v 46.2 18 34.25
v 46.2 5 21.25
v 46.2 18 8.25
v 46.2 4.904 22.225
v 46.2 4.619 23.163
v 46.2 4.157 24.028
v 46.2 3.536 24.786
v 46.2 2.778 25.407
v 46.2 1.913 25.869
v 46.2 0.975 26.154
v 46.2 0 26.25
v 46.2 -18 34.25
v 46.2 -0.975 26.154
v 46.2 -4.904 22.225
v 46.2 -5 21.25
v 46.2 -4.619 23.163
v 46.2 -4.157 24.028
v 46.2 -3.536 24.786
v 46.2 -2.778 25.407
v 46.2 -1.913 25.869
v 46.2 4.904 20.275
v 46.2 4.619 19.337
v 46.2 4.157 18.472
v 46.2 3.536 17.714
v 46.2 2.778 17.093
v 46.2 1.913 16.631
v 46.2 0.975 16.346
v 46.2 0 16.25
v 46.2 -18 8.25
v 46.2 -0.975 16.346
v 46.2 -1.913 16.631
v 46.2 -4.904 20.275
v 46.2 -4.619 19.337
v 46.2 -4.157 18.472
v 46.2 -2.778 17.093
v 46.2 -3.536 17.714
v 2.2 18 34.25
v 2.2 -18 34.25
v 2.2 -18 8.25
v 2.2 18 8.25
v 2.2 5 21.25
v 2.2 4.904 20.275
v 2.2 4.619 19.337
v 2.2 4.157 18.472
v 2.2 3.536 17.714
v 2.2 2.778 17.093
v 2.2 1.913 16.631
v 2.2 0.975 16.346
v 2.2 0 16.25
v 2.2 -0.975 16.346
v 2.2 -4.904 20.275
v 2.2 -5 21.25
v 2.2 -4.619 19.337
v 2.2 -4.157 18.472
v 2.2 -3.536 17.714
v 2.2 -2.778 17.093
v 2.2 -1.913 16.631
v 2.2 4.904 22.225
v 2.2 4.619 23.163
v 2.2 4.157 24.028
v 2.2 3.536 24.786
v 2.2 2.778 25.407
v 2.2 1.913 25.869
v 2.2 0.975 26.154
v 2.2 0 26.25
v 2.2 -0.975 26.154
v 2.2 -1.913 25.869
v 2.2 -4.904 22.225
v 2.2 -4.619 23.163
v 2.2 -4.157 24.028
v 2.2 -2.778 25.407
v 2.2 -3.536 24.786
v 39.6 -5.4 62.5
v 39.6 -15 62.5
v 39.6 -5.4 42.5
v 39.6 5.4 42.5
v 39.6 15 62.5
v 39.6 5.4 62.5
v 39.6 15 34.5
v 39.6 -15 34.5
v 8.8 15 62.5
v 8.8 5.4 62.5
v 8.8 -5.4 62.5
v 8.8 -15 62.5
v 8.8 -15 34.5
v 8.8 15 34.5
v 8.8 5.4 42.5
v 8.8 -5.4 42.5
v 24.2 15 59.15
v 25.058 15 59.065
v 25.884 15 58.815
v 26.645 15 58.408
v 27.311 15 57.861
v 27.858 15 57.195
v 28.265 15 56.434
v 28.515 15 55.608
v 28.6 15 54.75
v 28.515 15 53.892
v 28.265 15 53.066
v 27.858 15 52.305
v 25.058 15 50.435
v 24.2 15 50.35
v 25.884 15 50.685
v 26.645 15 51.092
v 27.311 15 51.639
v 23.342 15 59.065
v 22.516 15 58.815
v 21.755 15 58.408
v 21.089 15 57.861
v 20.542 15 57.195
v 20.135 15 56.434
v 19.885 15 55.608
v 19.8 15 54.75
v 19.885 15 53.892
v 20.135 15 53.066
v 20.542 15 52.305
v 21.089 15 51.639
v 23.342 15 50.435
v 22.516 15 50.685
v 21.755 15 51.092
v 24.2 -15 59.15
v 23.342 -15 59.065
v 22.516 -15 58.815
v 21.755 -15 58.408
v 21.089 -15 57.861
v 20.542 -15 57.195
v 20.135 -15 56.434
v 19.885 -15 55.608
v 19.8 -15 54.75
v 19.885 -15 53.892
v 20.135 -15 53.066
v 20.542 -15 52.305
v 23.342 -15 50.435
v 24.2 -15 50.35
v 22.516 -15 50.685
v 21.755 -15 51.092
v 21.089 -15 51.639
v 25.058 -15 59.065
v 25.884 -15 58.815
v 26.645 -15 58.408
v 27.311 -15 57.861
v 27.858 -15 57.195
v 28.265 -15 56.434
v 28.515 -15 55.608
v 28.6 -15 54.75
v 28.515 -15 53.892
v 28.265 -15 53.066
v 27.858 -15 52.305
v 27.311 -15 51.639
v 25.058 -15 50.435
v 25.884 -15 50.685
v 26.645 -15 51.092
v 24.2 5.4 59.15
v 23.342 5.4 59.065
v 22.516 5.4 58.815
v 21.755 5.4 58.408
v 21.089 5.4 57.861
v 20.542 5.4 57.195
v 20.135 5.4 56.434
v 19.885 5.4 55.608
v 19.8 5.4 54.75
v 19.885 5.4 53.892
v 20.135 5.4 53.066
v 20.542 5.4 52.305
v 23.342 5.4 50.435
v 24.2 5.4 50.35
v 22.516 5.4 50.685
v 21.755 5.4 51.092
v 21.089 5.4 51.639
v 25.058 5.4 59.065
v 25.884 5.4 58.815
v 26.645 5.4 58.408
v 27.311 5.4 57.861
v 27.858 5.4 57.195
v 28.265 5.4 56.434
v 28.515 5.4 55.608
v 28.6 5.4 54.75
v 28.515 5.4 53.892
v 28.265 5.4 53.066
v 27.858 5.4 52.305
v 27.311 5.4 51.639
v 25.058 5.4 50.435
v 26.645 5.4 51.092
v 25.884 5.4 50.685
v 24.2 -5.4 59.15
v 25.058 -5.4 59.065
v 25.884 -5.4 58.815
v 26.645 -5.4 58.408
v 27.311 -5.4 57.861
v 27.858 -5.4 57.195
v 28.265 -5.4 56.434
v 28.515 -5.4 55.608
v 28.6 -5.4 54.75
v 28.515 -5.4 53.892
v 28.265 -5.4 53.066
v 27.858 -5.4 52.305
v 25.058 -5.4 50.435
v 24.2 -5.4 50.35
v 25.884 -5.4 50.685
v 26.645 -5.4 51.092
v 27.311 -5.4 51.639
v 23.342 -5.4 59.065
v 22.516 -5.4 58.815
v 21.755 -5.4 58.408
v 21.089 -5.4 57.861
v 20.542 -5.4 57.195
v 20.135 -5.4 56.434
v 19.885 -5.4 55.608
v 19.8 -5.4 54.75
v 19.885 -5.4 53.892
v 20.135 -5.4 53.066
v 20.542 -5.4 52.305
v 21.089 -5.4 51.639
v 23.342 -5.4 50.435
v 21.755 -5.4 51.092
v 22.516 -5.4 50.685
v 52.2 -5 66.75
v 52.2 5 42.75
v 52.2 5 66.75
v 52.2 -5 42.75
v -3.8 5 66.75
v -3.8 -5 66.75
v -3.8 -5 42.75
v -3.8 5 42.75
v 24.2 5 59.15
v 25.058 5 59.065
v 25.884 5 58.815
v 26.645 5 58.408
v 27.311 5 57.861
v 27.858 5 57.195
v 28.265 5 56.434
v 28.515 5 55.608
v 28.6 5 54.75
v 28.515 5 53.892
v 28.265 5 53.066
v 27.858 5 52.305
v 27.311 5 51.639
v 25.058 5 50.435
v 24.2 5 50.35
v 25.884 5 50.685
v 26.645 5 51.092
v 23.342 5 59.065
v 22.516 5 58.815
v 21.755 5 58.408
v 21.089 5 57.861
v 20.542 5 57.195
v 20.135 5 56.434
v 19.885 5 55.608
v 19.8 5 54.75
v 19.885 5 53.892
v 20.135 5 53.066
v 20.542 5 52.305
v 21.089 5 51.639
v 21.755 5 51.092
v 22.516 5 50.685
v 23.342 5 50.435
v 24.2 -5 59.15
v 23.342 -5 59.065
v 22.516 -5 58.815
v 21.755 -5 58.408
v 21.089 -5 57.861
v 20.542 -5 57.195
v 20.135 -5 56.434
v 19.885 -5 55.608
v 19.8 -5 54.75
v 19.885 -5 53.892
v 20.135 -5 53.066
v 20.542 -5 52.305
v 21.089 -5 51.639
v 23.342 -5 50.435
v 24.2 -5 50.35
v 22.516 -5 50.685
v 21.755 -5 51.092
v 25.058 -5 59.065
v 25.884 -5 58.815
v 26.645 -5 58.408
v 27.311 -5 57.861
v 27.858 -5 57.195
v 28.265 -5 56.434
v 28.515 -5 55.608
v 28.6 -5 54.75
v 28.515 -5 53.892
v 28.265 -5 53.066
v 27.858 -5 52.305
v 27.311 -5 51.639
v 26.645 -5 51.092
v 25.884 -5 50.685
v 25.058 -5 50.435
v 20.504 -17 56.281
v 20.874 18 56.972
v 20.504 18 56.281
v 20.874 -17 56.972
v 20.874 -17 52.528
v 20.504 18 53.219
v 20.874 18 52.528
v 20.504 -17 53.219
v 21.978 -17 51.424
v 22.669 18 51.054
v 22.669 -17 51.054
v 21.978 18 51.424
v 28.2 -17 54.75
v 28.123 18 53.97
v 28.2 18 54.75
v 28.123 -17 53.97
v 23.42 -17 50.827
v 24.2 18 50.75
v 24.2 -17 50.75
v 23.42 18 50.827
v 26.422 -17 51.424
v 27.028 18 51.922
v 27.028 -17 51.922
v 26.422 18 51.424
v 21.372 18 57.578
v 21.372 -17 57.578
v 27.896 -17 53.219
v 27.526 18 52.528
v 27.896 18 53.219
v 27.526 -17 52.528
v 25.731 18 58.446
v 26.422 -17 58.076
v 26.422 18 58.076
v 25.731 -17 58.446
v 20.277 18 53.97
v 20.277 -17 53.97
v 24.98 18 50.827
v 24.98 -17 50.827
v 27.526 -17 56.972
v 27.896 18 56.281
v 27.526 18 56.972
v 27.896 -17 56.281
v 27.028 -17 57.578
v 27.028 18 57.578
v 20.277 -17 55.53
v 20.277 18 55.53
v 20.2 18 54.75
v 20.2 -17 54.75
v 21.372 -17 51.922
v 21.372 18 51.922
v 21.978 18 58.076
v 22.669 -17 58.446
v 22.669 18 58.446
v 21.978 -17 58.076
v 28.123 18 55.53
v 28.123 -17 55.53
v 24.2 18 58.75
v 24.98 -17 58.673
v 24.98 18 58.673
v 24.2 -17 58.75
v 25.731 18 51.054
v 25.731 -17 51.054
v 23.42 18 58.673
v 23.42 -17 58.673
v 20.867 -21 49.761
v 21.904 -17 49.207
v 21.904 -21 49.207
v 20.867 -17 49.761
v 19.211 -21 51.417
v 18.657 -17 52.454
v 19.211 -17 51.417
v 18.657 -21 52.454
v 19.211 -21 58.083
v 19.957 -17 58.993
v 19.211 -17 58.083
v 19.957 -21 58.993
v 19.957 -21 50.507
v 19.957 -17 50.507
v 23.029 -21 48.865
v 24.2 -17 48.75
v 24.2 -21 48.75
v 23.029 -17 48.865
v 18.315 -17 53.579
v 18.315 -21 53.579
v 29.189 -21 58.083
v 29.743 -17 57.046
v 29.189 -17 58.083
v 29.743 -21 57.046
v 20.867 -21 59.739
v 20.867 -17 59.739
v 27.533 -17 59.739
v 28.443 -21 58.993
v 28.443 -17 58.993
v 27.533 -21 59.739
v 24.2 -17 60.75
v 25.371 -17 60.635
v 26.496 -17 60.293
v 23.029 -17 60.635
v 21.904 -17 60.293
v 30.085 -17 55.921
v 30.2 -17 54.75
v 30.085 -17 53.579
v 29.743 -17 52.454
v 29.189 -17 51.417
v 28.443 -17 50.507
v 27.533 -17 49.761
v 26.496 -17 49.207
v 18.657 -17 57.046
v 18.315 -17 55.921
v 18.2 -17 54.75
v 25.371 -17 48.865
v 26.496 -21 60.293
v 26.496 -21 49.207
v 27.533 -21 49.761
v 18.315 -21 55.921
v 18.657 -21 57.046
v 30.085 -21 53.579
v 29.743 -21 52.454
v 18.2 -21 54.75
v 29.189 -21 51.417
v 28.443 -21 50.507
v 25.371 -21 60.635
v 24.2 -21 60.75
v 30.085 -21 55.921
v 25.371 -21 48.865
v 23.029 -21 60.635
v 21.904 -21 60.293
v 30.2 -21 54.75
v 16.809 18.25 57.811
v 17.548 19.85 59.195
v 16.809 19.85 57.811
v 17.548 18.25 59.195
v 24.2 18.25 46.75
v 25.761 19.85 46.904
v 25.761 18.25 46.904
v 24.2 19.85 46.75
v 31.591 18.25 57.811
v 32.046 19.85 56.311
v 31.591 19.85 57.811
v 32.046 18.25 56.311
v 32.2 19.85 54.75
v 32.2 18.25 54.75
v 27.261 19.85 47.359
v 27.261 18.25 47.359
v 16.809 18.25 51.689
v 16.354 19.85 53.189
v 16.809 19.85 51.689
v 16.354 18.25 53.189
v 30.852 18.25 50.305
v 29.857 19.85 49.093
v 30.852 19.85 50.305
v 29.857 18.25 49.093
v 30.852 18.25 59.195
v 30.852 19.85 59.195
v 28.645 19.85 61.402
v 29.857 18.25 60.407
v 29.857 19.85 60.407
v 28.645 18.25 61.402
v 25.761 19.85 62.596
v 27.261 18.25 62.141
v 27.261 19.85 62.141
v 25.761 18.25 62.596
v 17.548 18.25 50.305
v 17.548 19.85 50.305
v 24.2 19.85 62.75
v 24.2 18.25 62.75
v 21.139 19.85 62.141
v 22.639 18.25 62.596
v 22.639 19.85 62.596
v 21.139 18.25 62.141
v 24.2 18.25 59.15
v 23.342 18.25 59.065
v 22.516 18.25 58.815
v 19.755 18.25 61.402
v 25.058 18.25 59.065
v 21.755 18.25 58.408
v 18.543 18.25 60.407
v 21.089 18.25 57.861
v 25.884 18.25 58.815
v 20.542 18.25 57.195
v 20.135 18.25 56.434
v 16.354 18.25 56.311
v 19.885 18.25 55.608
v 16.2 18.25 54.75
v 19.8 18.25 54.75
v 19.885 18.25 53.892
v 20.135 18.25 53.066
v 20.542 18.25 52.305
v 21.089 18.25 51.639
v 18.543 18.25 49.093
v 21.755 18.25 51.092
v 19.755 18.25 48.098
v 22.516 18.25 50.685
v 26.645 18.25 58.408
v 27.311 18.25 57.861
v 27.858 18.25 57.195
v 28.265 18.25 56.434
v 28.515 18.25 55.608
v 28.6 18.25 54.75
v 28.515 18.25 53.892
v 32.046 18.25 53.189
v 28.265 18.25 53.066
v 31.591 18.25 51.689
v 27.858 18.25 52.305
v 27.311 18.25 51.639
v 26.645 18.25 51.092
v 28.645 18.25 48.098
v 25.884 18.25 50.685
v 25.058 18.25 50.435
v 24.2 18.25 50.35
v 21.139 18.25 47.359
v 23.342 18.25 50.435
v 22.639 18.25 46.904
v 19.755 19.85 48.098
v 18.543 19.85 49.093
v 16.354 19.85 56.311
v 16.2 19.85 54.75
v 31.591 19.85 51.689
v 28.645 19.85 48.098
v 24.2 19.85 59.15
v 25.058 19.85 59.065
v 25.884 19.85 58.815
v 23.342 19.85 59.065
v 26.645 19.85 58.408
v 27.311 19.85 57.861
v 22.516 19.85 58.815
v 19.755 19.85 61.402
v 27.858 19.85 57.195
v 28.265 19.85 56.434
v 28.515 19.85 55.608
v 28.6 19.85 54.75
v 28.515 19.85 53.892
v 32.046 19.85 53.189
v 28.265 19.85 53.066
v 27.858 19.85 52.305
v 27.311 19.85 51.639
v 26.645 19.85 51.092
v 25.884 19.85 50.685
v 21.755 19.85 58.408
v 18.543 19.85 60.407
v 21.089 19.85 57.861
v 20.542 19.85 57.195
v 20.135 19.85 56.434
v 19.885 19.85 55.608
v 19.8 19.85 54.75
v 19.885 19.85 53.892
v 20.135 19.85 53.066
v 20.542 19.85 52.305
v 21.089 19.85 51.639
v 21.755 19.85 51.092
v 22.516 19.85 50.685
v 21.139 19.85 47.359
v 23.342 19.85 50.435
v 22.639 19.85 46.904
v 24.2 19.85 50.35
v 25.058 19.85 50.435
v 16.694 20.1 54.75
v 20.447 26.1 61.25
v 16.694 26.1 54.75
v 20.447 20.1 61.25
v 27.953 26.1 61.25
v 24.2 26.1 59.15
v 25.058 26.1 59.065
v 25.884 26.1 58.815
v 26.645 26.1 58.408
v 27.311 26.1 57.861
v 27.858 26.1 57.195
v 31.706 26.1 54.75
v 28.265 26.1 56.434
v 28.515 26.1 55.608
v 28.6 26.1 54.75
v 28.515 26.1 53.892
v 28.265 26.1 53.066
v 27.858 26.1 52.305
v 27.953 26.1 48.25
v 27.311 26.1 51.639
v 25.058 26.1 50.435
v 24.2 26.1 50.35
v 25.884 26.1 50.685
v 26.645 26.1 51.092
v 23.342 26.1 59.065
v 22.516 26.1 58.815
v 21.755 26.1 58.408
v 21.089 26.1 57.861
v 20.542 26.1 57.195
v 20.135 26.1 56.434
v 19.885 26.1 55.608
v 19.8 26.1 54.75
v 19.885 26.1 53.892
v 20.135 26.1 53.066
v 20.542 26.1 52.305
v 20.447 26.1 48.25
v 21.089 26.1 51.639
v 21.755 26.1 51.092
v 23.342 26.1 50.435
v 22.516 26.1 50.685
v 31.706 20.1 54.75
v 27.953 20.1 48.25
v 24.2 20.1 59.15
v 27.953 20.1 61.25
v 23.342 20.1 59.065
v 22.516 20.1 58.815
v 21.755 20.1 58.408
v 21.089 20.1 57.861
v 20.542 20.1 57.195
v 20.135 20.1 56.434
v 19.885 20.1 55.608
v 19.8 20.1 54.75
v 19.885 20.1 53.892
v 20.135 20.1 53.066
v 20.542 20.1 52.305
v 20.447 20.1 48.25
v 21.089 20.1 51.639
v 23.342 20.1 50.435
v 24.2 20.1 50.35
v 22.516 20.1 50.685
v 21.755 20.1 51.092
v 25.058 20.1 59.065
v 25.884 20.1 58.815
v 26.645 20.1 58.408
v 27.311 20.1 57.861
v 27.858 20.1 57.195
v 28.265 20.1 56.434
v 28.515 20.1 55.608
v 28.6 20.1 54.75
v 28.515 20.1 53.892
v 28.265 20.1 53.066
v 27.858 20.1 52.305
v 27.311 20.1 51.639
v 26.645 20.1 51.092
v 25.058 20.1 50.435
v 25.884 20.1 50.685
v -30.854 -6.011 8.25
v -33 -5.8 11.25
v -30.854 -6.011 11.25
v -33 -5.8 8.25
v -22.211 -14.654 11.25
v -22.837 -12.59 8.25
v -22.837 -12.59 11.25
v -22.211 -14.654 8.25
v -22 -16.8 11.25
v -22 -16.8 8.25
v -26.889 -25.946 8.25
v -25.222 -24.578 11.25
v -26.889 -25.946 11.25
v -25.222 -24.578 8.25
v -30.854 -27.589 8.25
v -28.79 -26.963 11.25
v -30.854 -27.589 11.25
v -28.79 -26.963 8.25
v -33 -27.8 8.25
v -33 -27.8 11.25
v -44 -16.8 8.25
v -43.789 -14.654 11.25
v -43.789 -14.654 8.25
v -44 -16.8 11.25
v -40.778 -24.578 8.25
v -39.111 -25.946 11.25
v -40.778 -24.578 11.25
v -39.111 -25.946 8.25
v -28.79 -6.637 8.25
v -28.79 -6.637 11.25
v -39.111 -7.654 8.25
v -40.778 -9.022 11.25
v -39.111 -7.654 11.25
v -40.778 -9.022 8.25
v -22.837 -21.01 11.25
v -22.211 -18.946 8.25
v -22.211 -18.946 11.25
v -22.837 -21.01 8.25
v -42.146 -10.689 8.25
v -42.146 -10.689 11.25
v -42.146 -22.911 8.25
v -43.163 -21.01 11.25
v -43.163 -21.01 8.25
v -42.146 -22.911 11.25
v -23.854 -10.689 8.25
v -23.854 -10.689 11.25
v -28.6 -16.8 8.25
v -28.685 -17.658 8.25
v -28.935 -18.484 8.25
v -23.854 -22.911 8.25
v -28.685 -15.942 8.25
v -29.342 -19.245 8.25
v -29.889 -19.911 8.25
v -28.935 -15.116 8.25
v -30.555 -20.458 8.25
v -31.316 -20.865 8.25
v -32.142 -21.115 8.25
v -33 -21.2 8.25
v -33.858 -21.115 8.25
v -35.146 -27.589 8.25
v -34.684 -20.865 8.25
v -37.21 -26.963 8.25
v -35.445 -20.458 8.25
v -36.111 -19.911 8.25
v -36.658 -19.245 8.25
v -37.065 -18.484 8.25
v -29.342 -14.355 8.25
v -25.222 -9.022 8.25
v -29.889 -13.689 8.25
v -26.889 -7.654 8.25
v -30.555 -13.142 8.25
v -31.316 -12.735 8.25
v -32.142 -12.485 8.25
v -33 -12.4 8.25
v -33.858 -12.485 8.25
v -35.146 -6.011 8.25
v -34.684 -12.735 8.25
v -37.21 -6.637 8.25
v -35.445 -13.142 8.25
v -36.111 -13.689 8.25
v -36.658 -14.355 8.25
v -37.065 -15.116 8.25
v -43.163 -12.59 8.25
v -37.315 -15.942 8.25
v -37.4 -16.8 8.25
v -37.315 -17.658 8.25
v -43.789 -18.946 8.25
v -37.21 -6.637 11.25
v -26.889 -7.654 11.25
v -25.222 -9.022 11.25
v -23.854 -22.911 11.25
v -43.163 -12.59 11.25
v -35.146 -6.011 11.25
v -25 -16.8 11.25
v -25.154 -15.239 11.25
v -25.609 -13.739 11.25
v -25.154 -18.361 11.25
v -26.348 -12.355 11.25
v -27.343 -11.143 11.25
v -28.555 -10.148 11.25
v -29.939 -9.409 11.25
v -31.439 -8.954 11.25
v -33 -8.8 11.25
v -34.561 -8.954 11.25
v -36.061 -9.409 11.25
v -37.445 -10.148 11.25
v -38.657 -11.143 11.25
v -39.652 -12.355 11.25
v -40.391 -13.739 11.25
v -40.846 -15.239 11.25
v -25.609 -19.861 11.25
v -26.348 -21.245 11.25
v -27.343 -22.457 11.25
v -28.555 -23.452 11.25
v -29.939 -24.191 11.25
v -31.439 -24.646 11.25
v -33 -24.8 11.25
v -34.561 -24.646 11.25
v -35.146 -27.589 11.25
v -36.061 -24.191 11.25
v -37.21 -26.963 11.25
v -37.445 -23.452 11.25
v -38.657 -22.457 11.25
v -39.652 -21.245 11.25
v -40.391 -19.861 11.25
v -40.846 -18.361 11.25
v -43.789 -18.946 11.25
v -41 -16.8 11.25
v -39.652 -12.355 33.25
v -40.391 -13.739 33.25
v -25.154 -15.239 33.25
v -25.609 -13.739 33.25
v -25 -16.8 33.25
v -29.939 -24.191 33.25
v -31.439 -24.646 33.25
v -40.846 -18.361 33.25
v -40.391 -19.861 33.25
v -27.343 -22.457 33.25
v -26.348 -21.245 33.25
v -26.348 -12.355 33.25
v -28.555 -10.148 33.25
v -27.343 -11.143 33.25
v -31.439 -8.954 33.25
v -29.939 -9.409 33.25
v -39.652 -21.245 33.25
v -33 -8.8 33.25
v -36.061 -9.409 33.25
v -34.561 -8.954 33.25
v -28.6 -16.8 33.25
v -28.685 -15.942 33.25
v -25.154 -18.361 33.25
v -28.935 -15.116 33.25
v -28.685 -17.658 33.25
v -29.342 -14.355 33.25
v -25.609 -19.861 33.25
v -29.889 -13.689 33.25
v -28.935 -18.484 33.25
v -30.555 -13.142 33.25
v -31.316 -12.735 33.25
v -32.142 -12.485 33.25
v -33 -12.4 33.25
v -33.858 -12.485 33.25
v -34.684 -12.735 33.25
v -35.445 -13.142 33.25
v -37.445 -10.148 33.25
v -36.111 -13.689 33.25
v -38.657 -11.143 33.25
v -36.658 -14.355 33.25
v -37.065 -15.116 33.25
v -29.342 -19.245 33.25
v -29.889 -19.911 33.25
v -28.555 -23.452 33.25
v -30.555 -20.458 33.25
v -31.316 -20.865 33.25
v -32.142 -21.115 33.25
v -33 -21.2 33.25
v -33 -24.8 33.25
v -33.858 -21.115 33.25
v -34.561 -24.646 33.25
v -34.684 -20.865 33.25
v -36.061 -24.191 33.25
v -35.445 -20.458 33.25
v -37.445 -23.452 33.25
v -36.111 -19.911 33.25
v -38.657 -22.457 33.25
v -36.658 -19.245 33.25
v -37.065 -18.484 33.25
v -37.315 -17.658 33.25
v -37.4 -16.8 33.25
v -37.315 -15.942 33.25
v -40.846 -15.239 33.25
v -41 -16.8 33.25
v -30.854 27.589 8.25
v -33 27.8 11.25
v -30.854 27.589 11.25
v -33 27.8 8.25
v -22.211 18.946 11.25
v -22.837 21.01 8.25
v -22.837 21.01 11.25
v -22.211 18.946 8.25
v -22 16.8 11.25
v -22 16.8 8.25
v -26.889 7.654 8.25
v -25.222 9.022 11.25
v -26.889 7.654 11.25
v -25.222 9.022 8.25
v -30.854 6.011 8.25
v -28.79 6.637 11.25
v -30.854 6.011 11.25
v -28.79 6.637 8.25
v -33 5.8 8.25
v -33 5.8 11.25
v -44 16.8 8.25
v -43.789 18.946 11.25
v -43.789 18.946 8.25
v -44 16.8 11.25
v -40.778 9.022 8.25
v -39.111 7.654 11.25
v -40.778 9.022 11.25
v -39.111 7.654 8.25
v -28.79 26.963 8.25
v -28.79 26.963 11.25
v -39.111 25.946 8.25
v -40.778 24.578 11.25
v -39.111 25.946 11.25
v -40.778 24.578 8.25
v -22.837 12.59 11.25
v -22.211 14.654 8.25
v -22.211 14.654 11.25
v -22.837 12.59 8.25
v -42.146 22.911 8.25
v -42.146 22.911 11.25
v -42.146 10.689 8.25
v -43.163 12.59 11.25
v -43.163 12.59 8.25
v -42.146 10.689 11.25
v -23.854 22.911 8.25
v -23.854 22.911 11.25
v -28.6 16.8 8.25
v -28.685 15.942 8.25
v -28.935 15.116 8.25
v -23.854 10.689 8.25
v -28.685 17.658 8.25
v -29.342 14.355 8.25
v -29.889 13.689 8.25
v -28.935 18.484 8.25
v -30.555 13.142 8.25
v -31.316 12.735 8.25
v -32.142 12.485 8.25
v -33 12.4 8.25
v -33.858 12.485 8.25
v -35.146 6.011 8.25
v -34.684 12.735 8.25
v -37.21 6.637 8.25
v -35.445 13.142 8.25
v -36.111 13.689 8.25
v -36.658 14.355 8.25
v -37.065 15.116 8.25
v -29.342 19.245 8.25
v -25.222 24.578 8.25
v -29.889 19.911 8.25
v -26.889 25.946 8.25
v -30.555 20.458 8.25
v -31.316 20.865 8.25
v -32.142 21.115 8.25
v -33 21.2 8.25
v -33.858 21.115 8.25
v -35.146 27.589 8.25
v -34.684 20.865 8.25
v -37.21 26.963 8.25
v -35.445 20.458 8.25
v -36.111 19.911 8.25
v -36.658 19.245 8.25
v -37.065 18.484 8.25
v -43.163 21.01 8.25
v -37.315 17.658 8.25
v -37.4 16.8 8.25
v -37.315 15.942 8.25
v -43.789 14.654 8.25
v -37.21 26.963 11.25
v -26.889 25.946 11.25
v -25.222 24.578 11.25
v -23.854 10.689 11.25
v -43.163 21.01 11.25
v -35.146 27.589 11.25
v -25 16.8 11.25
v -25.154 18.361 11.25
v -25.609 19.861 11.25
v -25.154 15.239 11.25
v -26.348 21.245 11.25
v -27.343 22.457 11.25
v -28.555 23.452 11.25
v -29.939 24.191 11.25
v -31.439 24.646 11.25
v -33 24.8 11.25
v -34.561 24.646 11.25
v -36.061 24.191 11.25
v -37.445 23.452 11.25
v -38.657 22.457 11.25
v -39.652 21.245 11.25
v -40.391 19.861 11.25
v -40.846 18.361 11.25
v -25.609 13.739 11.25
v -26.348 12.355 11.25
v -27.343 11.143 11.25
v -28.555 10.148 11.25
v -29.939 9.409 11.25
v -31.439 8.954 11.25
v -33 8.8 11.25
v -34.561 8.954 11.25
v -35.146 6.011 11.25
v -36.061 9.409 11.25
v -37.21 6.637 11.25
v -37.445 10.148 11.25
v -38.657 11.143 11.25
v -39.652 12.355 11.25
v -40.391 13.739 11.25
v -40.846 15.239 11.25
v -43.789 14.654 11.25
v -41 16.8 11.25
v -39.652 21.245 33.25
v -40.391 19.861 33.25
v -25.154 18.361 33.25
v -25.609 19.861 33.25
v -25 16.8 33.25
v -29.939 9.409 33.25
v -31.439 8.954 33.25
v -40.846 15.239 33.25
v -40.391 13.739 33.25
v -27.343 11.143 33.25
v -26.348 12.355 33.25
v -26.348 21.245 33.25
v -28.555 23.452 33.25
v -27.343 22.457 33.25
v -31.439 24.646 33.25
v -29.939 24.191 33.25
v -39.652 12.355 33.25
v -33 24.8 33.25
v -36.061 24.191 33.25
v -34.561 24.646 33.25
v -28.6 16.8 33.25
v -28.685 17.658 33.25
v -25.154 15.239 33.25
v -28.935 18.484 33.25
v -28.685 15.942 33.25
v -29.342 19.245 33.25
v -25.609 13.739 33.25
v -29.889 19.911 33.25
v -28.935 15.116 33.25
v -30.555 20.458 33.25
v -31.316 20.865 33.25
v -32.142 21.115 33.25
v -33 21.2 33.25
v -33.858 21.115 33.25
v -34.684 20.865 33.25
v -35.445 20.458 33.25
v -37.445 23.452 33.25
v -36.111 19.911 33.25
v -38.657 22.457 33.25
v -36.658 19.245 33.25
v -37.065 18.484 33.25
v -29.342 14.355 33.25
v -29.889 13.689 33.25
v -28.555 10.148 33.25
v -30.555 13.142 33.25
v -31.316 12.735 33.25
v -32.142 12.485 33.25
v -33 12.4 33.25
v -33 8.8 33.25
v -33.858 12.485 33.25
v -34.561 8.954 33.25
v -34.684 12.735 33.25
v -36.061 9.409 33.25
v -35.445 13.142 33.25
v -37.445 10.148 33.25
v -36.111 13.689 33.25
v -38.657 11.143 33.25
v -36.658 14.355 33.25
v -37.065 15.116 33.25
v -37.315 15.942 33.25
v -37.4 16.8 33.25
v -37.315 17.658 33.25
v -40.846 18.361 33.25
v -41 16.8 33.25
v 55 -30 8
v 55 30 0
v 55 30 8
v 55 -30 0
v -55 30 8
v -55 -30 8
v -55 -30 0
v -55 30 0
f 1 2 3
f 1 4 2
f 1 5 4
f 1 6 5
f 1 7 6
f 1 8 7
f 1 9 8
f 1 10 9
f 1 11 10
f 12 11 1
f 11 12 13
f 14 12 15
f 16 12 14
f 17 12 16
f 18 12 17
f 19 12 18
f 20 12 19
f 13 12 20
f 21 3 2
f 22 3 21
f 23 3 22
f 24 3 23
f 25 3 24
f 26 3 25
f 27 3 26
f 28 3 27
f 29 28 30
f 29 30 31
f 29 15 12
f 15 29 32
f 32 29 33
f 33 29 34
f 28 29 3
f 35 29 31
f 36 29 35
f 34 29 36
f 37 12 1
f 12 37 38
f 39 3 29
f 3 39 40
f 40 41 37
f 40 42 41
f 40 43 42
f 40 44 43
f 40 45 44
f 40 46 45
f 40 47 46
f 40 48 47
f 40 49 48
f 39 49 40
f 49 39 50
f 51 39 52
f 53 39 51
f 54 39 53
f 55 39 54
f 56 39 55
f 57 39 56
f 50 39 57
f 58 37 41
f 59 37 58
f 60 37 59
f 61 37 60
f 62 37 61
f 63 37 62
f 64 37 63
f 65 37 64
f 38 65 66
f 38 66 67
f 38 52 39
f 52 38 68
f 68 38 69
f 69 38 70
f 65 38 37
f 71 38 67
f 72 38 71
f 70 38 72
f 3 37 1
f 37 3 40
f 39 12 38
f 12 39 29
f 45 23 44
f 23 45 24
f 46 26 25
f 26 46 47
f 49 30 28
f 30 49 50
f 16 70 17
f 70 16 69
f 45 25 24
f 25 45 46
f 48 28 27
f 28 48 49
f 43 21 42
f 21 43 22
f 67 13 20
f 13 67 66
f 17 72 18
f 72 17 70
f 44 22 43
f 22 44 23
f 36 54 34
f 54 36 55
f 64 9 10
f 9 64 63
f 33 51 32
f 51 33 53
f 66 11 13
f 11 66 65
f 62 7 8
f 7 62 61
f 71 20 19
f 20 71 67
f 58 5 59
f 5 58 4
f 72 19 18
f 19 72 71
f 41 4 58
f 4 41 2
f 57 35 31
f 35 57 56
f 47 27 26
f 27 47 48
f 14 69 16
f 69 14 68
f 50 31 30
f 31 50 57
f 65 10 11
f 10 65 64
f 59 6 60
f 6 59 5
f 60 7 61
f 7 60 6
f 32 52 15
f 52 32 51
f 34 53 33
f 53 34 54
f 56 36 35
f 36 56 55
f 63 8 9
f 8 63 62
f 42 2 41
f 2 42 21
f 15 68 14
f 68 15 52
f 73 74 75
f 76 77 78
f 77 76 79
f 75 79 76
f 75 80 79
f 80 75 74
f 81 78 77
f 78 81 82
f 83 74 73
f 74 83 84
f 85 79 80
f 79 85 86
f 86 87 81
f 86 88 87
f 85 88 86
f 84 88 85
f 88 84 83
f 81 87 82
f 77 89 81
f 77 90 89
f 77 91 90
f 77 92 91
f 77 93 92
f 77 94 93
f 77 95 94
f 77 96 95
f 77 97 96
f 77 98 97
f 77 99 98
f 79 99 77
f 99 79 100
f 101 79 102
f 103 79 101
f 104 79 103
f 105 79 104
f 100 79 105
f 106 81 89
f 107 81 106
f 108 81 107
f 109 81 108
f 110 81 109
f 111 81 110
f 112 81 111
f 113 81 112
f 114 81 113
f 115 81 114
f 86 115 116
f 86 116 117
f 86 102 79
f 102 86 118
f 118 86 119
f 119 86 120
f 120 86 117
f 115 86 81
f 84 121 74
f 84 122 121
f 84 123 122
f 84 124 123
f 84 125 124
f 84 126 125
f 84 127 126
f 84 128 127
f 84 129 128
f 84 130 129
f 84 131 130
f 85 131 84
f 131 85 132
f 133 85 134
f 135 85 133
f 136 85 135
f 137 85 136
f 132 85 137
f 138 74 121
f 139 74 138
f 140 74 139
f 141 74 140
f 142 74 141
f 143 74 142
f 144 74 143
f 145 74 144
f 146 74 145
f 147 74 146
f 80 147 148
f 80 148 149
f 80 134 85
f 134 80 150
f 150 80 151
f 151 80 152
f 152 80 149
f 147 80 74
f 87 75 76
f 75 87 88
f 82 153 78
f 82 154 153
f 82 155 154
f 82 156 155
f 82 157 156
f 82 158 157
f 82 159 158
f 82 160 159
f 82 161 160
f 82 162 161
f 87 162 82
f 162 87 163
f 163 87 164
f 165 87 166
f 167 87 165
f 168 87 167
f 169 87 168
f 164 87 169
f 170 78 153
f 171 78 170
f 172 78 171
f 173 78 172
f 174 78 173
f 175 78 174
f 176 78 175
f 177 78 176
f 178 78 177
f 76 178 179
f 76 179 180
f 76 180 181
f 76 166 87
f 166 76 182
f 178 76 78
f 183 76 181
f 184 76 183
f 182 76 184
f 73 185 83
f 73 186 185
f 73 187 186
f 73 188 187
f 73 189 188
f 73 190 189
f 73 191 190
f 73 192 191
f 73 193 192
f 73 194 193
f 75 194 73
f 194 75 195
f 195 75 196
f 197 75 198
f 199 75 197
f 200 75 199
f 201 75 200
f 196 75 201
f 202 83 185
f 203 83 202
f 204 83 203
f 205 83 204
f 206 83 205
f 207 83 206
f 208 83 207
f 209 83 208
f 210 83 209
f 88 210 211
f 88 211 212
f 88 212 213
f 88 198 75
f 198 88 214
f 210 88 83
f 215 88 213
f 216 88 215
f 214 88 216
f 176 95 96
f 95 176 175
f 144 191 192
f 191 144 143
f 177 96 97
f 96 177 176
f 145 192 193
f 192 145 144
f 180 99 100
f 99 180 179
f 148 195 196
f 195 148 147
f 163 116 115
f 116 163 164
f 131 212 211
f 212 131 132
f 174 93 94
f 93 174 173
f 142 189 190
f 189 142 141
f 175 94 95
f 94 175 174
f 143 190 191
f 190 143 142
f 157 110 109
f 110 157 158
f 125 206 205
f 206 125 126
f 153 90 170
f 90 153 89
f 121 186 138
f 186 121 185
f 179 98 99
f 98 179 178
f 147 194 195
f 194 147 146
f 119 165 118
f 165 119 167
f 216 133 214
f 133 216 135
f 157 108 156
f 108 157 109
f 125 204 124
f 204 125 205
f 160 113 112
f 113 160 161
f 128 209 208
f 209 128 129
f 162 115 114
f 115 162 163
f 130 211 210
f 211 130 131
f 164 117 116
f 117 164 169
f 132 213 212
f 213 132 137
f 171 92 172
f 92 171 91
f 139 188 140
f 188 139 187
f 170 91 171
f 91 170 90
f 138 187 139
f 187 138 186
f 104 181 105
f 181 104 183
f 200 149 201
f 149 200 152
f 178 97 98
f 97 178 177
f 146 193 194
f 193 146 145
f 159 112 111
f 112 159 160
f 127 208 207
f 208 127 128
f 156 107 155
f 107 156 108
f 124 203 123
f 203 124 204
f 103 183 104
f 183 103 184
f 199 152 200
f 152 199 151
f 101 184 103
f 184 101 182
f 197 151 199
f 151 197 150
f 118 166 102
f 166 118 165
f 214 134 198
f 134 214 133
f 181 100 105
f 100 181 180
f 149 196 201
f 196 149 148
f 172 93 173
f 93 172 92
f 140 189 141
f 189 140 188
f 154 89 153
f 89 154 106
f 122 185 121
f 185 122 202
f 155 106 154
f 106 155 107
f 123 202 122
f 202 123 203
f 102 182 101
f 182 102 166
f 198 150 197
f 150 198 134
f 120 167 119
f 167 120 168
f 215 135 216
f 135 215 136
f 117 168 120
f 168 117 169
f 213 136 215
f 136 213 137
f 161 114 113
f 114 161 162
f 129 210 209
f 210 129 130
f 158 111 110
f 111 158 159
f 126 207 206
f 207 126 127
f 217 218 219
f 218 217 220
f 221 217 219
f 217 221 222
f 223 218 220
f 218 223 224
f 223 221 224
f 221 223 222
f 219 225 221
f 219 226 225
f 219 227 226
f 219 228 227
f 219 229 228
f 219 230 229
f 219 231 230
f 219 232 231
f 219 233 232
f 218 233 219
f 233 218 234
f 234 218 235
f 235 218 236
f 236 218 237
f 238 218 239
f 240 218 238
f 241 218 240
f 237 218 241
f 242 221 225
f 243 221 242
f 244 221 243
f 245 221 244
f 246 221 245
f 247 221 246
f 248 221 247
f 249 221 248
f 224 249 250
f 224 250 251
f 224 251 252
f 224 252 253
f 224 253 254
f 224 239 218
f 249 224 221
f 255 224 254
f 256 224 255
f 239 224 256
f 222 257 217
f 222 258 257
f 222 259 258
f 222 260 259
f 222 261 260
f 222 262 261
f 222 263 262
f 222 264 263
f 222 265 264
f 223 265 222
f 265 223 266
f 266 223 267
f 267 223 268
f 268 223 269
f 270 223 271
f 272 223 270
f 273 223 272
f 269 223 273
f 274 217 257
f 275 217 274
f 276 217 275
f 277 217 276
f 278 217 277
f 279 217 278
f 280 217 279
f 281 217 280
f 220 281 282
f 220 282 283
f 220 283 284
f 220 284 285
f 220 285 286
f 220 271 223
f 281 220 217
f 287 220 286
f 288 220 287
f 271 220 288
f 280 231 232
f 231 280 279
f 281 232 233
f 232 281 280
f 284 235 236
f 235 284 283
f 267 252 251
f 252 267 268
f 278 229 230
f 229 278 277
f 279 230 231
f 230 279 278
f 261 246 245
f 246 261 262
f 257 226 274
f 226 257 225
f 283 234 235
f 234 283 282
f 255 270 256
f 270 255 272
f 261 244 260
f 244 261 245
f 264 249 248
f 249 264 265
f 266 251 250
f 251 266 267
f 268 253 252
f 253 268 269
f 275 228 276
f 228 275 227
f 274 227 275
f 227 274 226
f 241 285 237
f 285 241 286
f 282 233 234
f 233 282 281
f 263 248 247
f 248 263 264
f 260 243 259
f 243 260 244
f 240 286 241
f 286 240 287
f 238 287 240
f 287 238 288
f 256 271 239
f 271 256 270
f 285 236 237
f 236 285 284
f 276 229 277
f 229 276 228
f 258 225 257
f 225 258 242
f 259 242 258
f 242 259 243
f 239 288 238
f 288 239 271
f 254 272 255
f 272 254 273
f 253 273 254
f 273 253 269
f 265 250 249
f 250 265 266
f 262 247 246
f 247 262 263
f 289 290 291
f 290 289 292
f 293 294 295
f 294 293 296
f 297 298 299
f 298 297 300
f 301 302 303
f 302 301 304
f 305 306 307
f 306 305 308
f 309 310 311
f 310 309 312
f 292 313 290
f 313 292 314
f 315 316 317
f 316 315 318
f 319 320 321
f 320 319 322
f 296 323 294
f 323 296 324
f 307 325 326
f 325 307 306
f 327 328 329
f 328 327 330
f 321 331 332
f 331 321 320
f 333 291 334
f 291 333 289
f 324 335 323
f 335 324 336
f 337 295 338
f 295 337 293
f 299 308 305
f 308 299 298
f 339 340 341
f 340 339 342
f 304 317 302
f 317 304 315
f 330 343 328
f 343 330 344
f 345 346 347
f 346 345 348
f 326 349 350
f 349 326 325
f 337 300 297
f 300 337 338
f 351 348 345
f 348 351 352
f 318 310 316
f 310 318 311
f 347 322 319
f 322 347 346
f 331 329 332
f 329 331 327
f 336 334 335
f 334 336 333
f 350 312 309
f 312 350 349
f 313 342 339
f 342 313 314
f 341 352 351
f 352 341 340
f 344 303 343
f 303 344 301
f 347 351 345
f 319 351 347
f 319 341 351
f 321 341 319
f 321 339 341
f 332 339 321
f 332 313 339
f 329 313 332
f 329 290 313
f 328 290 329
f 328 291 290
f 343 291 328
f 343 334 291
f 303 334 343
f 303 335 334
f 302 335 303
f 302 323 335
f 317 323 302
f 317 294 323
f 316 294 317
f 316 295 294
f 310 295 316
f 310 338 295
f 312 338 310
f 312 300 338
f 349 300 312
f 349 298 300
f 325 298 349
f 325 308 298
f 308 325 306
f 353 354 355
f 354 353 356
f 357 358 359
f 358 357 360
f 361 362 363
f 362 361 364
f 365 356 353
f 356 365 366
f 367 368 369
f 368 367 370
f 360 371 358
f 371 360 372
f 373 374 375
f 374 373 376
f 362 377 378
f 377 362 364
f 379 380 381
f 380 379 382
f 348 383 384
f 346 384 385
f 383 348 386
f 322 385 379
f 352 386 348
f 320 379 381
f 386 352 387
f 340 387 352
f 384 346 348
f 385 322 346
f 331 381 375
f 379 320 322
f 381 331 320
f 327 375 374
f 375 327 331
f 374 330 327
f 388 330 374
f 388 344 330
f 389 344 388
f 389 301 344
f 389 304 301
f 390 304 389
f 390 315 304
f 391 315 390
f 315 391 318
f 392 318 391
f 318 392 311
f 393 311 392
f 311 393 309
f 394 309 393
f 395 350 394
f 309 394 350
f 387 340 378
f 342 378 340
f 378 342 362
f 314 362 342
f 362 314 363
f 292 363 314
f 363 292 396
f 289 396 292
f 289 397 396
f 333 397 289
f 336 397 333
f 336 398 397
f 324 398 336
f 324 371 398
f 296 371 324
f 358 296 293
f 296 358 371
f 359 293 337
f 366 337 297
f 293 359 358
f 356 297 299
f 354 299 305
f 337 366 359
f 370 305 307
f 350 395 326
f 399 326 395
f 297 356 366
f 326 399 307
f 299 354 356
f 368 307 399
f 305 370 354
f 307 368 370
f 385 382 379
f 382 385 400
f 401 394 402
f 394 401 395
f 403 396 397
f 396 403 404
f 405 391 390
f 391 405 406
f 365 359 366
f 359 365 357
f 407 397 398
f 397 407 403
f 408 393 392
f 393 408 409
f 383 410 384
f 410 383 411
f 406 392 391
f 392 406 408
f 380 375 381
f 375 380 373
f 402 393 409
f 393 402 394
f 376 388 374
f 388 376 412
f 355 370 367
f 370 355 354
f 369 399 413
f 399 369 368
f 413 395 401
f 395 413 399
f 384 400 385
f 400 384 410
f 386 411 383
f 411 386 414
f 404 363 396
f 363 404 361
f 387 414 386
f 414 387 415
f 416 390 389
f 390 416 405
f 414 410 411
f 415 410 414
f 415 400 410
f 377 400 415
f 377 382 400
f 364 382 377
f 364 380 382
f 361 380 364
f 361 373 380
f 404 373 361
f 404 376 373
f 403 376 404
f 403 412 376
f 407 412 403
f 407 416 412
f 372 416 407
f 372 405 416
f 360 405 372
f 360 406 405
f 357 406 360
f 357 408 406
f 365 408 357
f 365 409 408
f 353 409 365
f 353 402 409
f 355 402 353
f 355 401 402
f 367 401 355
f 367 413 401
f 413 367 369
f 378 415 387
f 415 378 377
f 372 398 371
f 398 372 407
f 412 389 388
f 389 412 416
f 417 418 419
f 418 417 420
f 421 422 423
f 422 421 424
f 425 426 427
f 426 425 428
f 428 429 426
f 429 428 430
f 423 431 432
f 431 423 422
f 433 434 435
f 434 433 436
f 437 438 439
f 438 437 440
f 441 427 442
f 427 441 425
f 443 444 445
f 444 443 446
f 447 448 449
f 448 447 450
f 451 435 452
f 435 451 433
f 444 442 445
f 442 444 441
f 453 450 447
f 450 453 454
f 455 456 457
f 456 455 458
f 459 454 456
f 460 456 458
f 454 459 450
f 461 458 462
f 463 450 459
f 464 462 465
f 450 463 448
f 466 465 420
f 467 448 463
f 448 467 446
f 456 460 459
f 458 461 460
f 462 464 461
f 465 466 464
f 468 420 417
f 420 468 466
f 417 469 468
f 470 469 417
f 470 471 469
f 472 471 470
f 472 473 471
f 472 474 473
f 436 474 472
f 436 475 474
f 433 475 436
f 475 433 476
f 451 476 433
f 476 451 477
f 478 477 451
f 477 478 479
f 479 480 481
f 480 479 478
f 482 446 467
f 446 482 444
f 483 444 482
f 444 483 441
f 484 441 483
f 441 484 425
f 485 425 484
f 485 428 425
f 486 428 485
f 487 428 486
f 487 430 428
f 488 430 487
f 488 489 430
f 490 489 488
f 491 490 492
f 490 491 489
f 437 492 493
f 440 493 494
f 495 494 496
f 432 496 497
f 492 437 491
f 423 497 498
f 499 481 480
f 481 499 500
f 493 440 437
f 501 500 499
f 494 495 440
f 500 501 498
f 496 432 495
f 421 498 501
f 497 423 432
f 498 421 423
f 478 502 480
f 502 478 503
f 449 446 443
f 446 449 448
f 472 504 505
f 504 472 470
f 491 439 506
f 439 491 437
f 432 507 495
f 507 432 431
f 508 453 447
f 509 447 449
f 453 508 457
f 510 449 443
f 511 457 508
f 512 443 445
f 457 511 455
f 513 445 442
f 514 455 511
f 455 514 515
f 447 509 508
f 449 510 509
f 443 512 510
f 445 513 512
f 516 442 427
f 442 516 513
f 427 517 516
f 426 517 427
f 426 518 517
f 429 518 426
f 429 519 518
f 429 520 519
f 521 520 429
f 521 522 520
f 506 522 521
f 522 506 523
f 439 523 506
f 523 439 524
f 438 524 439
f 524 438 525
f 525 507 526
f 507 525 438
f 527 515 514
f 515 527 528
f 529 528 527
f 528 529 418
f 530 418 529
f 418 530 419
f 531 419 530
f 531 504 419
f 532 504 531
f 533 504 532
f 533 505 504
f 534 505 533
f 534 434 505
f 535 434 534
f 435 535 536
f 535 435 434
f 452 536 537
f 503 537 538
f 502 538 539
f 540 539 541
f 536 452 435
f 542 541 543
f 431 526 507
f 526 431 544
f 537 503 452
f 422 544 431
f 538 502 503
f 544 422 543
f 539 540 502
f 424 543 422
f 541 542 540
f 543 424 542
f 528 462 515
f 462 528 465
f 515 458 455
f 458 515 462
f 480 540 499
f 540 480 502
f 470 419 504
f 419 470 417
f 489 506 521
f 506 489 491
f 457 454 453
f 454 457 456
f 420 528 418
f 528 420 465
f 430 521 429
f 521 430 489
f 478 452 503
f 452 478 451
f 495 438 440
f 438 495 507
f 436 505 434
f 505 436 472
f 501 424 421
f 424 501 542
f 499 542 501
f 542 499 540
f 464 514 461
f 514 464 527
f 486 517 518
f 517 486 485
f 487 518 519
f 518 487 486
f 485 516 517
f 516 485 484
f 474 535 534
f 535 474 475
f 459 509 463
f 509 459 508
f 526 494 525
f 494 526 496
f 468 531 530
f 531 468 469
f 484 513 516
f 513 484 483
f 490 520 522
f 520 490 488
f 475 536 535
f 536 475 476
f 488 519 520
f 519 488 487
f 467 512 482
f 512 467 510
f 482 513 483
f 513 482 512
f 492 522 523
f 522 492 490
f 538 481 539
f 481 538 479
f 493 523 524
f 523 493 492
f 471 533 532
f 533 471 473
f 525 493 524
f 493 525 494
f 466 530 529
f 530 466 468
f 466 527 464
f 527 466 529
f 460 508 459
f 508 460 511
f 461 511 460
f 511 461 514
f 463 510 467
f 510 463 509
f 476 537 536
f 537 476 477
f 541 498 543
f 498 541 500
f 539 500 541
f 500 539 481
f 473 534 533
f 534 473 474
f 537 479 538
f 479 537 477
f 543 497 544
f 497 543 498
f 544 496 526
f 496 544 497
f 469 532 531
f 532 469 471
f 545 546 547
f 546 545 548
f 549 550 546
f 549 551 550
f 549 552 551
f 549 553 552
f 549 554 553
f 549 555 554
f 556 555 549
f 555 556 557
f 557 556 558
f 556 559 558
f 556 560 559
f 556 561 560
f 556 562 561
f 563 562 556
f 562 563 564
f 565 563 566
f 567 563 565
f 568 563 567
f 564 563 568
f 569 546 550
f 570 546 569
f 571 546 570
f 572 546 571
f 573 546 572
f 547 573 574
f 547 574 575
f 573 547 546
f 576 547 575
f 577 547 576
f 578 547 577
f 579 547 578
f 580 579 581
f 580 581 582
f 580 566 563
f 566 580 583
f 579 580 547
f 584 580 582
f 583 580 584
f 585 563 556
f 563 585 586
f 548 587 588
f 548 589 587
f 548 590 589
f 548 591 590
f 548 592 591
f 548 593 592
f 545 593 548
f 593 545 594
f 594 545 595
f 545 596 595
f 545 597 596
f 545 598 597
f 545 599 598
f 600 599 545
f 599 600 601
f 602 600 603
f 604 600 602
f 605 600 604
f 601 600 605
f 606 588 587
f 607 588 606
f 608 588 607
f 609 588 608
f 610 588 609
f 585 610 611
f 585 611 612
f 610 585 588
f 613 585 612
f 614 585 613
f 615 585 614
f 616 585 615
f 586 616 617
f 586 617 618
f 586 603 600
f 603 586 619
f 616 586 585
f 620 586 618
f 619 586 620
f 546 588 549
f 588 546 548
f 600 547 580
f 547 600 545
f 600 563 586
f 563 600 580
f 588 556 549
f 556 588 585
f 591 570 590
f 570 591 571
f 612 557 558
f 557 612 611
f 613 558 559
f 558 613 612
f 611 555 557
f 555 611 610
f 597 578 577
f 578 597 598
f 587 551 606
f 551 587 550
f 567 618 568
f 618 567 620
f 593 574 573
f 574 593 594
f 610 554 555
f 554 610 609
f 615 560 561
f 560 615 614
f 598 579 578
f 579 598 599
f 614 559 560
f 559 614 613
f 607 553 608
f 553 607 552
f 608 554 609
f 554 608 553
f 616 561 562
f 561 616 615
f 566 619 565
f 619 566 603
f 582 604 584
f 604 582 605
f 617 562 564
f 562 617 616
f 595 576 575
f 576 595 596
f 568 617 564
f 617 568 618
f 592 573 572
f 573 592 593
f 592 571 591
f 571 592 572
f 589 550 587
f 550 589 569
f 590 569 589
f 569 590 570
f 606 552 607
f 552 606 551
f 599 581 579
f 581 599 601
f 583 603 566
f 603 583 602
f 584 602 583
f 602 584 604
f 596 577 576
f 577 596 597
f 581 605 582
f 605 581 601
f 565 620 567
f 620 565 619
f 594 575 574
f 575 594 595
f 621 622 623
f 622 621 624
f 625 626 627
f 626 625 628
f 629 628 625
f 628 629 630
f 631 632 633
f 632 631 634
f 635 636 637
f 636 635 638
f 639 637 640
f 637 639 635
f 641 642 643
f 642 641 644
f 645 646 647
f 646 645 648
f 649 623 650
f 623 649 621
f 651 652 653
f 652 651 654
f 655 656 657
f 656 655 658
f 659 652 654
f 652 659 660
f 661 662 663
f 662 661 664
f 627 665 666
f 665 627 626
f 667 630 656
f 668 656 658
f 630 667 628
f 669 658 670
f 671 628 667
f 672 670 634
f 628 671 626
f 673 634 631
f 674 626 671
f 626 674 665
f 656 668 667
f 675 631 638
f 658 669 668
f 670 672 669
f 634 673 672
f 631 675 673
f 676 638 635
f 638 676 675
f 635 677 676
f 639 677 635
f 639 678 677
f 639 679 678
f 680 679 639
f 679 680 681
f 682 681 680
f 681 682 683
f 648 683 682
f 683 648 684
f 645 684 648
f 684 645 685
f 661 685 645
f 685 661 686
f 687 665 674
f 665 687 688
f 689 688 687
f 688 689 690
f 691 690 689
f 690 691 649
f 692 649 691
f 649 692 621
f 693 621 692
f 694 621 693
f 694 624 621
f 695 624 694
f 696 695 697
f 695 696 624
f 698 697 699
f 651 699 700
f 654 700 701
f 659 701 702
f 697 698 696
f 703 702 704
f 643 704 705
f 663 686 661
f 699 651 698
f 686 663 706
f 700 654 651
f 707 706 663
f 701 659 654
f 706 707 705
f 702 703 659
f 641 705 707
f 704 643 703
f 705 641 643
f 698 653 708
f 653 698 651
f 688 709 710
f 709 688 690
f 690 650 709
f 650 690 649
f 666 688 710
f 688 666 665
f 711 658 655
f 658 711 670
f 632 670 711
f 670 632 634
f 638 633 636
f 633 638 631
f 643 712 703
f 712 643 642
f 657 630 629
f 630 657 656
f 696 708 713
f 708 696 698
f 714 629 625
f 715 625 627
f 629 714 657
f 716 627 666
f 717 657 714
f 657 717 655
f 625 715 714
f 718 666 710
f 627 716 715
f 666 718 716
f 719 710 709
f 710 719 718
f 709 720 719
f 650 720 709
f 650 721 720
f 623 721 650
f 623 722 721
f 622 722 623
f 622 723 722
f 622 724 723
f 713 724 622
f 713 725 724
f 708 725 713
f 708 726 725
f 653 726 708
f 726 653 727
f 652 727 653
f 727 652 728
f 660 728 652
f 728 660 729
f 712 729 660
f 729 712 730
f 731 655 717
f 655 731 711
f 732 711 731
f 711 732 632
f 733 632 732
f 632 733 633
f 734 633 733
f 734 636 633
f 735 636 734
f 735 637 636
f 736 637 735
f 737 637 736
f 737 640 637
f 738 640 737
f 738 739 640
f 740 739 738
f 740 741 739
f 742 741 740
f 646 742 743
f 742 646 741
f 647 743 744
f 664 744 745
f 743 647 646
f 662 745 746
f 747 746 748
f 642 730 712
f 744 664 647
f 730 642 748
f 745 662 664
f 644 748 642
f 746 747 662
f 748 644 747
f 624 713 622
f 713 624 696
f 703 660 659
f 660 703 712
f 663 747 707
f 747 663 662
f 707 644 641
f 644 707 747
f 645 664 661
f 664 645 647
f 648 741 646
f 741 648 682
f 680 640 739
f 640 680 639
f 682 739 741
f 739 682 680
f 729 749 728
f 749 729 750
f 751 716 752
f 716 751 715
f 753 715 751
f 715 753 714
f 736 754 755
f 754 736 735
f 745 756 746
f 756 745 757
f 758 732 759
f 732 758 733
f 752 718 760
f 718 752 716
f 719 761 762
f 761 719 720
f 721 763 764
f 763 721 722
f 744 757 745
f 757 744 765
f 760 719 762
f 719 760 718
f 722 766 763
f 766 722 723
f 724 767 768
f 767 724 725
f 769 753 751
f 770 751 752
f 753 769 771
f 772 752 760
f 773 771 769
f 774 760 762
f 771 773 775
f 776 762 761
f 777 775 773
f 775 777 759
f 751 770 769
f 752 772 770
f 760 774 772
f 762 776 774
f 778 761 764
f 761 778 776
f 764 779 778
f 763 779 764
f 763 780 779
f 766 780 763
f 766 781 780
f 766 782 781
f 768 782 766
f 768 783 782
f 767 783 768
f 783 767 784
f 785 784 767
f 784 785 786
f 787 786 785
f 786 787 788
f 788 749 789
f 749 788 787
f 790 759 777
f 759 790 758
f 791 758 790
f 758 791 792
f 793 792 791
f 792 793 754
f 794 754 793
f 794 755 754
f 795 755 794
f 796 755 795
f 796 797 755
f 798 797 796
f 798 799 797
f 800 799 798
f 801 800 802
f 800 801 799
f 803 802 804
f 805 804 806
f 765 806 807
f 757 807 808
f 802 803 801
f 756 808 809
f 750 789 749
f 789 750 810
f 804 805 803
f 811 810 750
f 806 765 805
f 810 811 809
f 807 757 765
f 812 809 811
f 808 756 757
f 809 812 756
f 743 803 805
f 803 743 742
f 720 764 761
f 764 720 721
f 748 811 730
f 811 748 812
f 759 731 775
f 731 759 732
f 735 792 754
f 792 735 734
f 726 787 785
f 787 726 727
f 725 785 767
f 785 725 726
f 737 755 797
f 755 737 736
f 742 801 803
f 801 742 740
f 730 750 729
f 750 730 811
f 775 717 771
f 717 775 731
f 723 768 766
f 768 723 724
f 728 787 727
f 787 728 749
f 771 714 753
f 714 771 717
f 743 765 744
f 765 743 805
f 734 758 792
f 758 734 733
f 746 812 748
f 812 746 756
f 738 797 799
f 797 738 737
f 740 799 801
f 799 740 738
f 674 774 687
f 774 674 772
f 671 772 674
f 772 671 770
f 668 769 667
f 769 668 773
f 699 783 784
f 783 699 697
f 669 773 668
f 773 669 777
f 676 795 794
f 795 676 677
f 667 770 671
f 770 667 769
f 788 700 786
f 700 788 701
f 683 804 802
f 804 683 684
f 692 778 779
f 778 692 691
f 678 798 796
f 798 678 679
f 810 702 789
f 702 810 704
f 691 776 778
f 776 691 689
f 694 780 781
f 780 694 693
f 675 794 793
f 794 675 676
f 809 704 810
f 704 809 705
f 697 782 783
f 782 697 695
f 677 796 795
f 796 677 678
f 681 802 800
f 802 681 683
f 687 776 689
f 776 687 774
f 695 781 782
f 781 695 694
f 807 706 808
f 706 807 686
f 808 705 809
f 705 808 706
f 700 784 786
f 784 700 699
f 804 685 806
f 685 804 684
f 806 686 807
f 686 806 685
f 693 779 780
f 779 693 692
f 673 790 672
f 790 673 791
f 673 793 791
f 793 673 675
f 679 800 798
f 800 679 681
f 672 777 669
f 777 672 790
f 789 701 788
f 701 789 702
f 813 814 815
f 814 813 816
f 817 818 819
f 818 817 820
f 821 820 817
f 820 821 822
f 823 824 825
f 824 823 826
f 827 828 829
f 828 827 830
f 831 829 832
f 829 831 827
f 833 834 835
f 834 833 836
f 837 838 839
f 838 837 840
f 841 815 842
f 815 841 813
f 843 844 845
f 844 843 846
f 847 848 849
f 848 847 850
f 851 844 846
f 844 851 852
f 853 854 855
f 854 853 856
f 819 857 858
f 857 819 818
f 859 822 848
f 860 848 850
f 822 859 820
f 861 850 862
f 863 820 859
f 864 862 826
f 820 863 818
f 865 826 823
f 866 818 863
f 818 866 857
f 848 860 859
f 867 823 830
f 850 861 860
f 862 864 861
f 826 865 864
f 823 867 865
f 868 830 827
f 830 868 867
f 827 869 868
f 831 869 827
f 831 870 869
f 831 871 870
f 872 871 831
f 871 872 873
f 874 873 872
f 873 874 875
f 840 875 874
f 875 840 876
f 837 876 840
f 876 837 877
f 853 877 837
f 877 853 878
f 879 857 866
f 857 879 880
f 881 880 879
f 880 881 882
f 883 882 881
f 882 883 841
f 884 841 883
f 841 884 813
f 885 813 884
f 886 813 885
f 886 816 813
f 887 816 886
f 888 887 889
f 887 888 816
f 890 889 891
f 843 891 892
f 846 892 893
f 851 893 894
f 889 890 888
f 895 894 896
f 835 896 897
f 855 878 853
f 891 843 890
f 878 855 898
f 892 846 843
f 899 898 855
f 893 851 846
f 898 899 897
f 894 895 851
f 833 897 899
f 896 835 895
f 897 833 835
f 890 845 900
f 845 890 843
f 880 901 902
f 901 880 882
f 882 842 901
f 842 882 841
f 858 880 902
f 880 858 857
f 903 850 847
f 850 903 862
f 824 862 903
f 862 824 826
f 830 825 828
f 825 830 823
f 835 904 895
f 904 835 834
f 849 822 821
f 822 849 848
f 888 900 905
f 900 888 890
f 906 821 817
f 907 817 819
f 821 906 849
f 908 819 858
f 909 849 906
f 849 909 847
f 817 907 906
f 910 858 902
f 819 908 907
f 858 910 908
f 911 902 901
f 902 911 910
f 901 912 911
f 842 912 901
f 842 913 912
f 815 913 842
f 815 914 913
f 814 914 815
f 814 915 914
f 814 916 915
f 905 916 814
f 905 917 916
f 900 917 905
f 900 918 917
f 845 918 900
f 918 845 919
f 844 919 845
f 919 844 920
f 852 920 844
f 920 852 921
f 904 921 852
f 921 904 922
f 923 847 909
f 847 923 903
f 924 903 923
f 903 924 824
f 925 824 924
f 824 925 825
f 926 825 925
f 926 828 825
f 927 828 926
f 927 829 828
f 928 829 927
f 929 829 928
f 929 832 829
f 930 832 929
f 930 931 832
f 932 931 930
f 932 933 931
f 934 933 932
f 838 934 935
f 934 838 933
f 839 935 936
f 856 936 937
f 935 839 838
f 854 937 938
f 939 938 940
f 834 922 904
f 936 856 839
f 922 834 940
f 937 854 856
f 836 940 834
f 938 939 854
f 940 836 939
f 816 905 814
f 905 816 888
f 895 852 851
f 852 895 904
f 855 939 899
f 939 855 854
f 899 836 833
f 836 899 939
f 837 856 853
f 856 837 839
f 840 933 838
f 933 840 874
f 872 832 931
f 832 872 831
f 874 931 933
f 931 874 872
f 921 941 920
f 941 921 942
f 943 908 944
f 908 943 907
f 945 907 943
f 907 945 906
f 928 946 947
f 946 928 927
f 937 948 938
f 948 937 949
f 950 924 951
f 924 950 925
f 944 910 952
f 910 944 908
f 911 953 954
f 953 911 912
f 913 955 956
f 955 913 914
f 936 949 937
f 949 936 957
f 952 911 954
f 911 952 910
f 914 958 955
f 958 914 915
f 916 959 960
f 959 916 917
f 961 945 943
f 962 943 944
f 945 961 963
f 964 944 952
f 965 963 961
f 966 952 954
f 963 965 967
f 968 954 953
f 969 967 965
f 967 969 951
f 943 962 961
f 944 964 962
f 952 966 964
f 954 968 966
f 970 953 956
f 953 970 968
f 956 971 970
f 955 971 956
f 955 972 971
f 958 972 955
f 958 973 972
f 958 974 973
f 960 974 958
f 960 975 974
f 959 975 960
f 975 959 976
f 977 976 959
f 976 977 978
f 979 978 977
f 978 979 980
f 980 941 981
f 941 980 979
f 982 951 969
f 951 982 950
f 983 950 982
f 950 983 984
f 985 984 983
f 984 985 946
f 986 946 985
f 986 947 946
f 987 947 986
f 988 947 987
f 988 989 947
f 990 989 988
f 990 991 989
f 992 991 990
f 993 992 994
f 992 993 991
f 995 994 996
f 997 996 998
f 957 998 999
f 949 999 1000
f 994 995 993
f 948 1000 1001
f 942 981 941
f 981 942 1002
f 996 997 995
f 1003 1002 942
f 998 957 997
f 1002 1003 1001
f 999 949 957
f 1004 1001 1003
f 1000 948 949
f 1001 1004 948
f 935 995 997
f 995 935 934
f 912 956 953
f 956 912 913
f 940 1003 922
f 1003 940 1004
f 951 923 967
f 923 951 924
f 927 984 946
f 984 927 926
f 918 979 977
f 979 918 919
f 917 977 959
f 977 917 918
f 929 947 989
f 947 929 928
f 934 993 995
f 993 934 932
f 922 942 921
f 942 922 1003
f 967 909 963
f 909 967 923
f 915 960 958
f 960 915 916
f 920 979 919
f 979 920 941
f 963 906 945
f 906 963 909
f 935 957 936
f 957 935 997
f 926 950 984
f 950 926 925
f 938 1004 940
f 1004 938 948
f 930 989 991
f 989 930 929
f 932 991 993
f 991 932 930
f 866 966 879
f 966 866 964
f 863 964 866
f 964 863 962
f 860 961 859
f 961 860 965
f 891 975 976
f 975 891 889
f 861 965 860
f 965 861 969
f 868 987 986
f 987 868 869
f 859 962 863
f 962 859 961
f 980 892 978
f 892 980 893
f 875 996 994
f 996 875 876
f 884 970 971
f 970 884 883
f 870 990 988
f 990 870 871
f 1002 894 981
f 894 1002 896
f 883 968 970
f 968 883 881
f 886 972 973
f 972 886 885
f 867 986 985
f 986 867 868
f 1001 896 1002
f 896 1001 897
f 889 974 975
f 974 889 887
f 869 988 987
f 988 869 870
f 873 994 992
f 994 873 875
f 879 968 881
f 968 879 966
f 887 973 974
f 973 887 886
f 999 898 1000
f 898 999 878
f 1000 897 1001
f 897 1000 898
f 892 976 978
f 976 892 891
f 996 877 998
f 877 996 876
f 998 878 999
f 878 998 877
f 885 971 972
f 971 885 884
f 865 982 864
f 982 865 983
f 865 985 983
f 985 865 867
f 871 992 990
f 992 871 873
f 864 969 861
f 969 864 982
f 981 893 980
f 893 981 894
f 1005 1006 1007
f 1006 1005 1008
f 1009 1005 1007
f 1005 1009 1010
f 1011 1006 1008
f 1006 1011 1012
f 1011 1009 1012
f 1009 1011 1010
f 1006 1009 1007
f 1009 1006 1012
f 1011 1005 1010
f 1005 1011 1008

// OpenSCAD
$fn = 32;

// ------------------------------------------------------------------------
// Indexing jig: plate 110 x 60 mm, pin d8
// Every part is its own module, assembly() places every instance.
// ------------------------------------------------------------------------

// --- part 1 ---
module jig_plate() {
  difference() {
    translate([-55, -30, 0]) cube([110, 60, 8]);
  }
}

// --- part 2 ---
module locator_block() {
  difference() {
    translate([-22, -18, 0]) cube([44, 36, 26]);
    translate([0, 0, 13]) rotate([0, 90, 0]) cylinder(h = 46, d = 10, center = true);
  }
}

// --- part 3 ---
module index_fork() {
  difference() {
    translate([-15.4, -15, 0]) cube([30.8, 30, 28]);
    translate([-16.4, -5.4, 8]) cube([32.8, 10.8, 21]);
    translate([0, 0, 20.25]) rotate([90, 0, 0]) cylinder(h = 32, d = 8.8, center = true);
  }
}

// --- part 4 ---
module index_arm() {
  difference() {
    translate([-28, -5, 0]) cube([56, 10, 24]);
    translate([0, 0, 12]) rotate([90, 0, 0]) cylinder(h = 12, d = 8.8, center = true);
  }
}

// --- part 5 ---
module index_pin() {
  rotate([0, 90, 0]) cylinder(h = 36, d = 8, center = true);
  translate([-21, 0, 0]) rotate([0, 90, 0]) cylinder(h = 4, d = 12);
}

// --- part 6 ---
module pin_washer() {
  difference() {
      translate([0, 0, 0]) cylinder(h = 1.6, d = 16);
      translate([0, 0, -1]) cylinder(h = 3.6, d = 8.8);
    }
}

// --- part 7 ---
module lock_nut() {
  difference() {
    linear_extrude(height = 6) polygon(points = [[7.506, 0], [3.753, 6.5], [-3.753, 6.5], [-7.506, 0], [-3.753, -6.5], [3.753, -6.5]]);
    translate([0, 0, -1]) cylinder(h = 8, d = 8.8);
  }
}

// --- part 8 ---
module guide_bush_a() {
  difference() {
    union() {
      cylinder(h = 3, d = 22);
      translate([0, 0, 3]) cylinder(h = 22, d = 16);
    }
    translate([0, 0, -1]) cylinder(h = 27, d = 8.8);
  }
}

// --- part 9 ---
module guide_bush_b() {
  difference() {
    union() {
      cylinder(h = 3, d = 22);
      translate([0, 0, 3]) cylinder(h = 22, d = 16);
    }
    translate([0, 0, -1]) cylinder(h = 27, d = 8.8);
  }
}

// --- assembly ---
module assembly() {
  color([0.80, 0.24, 0.20]) translate([0, 0, 0]) rotate([0, 0, 0]) jig_plate();
  color([0.20, 0.45, 0.75]) translate([24.2, 0, 8.25]) rotate([0, 0, 0]) locator_block();
  color([0.25, 0.62, 0.32]) translate([24.2, 0, 34.5]) rotate([0, 0, 0]) index_fork();
  color([0.92, 0.70, 0.18]) translate([24.2, 0, 42.75]) rotate([0, 0, 0]) index_arm();
  color([0.58, 0.35, 0.70]) translate([24.2, 0, 54.75]) rotate([0, 0, 90]) index_pin();
  color([0.16, 0.66, 0.66]) translate([24.2, 19.85, 54.75]) rotate([90, 0, 0]) pin_washer();
  color([0.85, 0.48, 0.18]) translate([24.2, 26.1, 54.75]) rotate([90, 0, 0]) lock_nut();
  color([0.55, 0.60, 0.65]) translate([-33, -16.8, 8.25]) rotate([0, 0, 0]) guide_bush_a();
  color([0.75, 0.30, 0.55]) translate([-33, 16.8, 8.25]) rotate([0, 0, 0]) guide_bush_b();
}

assembly();
